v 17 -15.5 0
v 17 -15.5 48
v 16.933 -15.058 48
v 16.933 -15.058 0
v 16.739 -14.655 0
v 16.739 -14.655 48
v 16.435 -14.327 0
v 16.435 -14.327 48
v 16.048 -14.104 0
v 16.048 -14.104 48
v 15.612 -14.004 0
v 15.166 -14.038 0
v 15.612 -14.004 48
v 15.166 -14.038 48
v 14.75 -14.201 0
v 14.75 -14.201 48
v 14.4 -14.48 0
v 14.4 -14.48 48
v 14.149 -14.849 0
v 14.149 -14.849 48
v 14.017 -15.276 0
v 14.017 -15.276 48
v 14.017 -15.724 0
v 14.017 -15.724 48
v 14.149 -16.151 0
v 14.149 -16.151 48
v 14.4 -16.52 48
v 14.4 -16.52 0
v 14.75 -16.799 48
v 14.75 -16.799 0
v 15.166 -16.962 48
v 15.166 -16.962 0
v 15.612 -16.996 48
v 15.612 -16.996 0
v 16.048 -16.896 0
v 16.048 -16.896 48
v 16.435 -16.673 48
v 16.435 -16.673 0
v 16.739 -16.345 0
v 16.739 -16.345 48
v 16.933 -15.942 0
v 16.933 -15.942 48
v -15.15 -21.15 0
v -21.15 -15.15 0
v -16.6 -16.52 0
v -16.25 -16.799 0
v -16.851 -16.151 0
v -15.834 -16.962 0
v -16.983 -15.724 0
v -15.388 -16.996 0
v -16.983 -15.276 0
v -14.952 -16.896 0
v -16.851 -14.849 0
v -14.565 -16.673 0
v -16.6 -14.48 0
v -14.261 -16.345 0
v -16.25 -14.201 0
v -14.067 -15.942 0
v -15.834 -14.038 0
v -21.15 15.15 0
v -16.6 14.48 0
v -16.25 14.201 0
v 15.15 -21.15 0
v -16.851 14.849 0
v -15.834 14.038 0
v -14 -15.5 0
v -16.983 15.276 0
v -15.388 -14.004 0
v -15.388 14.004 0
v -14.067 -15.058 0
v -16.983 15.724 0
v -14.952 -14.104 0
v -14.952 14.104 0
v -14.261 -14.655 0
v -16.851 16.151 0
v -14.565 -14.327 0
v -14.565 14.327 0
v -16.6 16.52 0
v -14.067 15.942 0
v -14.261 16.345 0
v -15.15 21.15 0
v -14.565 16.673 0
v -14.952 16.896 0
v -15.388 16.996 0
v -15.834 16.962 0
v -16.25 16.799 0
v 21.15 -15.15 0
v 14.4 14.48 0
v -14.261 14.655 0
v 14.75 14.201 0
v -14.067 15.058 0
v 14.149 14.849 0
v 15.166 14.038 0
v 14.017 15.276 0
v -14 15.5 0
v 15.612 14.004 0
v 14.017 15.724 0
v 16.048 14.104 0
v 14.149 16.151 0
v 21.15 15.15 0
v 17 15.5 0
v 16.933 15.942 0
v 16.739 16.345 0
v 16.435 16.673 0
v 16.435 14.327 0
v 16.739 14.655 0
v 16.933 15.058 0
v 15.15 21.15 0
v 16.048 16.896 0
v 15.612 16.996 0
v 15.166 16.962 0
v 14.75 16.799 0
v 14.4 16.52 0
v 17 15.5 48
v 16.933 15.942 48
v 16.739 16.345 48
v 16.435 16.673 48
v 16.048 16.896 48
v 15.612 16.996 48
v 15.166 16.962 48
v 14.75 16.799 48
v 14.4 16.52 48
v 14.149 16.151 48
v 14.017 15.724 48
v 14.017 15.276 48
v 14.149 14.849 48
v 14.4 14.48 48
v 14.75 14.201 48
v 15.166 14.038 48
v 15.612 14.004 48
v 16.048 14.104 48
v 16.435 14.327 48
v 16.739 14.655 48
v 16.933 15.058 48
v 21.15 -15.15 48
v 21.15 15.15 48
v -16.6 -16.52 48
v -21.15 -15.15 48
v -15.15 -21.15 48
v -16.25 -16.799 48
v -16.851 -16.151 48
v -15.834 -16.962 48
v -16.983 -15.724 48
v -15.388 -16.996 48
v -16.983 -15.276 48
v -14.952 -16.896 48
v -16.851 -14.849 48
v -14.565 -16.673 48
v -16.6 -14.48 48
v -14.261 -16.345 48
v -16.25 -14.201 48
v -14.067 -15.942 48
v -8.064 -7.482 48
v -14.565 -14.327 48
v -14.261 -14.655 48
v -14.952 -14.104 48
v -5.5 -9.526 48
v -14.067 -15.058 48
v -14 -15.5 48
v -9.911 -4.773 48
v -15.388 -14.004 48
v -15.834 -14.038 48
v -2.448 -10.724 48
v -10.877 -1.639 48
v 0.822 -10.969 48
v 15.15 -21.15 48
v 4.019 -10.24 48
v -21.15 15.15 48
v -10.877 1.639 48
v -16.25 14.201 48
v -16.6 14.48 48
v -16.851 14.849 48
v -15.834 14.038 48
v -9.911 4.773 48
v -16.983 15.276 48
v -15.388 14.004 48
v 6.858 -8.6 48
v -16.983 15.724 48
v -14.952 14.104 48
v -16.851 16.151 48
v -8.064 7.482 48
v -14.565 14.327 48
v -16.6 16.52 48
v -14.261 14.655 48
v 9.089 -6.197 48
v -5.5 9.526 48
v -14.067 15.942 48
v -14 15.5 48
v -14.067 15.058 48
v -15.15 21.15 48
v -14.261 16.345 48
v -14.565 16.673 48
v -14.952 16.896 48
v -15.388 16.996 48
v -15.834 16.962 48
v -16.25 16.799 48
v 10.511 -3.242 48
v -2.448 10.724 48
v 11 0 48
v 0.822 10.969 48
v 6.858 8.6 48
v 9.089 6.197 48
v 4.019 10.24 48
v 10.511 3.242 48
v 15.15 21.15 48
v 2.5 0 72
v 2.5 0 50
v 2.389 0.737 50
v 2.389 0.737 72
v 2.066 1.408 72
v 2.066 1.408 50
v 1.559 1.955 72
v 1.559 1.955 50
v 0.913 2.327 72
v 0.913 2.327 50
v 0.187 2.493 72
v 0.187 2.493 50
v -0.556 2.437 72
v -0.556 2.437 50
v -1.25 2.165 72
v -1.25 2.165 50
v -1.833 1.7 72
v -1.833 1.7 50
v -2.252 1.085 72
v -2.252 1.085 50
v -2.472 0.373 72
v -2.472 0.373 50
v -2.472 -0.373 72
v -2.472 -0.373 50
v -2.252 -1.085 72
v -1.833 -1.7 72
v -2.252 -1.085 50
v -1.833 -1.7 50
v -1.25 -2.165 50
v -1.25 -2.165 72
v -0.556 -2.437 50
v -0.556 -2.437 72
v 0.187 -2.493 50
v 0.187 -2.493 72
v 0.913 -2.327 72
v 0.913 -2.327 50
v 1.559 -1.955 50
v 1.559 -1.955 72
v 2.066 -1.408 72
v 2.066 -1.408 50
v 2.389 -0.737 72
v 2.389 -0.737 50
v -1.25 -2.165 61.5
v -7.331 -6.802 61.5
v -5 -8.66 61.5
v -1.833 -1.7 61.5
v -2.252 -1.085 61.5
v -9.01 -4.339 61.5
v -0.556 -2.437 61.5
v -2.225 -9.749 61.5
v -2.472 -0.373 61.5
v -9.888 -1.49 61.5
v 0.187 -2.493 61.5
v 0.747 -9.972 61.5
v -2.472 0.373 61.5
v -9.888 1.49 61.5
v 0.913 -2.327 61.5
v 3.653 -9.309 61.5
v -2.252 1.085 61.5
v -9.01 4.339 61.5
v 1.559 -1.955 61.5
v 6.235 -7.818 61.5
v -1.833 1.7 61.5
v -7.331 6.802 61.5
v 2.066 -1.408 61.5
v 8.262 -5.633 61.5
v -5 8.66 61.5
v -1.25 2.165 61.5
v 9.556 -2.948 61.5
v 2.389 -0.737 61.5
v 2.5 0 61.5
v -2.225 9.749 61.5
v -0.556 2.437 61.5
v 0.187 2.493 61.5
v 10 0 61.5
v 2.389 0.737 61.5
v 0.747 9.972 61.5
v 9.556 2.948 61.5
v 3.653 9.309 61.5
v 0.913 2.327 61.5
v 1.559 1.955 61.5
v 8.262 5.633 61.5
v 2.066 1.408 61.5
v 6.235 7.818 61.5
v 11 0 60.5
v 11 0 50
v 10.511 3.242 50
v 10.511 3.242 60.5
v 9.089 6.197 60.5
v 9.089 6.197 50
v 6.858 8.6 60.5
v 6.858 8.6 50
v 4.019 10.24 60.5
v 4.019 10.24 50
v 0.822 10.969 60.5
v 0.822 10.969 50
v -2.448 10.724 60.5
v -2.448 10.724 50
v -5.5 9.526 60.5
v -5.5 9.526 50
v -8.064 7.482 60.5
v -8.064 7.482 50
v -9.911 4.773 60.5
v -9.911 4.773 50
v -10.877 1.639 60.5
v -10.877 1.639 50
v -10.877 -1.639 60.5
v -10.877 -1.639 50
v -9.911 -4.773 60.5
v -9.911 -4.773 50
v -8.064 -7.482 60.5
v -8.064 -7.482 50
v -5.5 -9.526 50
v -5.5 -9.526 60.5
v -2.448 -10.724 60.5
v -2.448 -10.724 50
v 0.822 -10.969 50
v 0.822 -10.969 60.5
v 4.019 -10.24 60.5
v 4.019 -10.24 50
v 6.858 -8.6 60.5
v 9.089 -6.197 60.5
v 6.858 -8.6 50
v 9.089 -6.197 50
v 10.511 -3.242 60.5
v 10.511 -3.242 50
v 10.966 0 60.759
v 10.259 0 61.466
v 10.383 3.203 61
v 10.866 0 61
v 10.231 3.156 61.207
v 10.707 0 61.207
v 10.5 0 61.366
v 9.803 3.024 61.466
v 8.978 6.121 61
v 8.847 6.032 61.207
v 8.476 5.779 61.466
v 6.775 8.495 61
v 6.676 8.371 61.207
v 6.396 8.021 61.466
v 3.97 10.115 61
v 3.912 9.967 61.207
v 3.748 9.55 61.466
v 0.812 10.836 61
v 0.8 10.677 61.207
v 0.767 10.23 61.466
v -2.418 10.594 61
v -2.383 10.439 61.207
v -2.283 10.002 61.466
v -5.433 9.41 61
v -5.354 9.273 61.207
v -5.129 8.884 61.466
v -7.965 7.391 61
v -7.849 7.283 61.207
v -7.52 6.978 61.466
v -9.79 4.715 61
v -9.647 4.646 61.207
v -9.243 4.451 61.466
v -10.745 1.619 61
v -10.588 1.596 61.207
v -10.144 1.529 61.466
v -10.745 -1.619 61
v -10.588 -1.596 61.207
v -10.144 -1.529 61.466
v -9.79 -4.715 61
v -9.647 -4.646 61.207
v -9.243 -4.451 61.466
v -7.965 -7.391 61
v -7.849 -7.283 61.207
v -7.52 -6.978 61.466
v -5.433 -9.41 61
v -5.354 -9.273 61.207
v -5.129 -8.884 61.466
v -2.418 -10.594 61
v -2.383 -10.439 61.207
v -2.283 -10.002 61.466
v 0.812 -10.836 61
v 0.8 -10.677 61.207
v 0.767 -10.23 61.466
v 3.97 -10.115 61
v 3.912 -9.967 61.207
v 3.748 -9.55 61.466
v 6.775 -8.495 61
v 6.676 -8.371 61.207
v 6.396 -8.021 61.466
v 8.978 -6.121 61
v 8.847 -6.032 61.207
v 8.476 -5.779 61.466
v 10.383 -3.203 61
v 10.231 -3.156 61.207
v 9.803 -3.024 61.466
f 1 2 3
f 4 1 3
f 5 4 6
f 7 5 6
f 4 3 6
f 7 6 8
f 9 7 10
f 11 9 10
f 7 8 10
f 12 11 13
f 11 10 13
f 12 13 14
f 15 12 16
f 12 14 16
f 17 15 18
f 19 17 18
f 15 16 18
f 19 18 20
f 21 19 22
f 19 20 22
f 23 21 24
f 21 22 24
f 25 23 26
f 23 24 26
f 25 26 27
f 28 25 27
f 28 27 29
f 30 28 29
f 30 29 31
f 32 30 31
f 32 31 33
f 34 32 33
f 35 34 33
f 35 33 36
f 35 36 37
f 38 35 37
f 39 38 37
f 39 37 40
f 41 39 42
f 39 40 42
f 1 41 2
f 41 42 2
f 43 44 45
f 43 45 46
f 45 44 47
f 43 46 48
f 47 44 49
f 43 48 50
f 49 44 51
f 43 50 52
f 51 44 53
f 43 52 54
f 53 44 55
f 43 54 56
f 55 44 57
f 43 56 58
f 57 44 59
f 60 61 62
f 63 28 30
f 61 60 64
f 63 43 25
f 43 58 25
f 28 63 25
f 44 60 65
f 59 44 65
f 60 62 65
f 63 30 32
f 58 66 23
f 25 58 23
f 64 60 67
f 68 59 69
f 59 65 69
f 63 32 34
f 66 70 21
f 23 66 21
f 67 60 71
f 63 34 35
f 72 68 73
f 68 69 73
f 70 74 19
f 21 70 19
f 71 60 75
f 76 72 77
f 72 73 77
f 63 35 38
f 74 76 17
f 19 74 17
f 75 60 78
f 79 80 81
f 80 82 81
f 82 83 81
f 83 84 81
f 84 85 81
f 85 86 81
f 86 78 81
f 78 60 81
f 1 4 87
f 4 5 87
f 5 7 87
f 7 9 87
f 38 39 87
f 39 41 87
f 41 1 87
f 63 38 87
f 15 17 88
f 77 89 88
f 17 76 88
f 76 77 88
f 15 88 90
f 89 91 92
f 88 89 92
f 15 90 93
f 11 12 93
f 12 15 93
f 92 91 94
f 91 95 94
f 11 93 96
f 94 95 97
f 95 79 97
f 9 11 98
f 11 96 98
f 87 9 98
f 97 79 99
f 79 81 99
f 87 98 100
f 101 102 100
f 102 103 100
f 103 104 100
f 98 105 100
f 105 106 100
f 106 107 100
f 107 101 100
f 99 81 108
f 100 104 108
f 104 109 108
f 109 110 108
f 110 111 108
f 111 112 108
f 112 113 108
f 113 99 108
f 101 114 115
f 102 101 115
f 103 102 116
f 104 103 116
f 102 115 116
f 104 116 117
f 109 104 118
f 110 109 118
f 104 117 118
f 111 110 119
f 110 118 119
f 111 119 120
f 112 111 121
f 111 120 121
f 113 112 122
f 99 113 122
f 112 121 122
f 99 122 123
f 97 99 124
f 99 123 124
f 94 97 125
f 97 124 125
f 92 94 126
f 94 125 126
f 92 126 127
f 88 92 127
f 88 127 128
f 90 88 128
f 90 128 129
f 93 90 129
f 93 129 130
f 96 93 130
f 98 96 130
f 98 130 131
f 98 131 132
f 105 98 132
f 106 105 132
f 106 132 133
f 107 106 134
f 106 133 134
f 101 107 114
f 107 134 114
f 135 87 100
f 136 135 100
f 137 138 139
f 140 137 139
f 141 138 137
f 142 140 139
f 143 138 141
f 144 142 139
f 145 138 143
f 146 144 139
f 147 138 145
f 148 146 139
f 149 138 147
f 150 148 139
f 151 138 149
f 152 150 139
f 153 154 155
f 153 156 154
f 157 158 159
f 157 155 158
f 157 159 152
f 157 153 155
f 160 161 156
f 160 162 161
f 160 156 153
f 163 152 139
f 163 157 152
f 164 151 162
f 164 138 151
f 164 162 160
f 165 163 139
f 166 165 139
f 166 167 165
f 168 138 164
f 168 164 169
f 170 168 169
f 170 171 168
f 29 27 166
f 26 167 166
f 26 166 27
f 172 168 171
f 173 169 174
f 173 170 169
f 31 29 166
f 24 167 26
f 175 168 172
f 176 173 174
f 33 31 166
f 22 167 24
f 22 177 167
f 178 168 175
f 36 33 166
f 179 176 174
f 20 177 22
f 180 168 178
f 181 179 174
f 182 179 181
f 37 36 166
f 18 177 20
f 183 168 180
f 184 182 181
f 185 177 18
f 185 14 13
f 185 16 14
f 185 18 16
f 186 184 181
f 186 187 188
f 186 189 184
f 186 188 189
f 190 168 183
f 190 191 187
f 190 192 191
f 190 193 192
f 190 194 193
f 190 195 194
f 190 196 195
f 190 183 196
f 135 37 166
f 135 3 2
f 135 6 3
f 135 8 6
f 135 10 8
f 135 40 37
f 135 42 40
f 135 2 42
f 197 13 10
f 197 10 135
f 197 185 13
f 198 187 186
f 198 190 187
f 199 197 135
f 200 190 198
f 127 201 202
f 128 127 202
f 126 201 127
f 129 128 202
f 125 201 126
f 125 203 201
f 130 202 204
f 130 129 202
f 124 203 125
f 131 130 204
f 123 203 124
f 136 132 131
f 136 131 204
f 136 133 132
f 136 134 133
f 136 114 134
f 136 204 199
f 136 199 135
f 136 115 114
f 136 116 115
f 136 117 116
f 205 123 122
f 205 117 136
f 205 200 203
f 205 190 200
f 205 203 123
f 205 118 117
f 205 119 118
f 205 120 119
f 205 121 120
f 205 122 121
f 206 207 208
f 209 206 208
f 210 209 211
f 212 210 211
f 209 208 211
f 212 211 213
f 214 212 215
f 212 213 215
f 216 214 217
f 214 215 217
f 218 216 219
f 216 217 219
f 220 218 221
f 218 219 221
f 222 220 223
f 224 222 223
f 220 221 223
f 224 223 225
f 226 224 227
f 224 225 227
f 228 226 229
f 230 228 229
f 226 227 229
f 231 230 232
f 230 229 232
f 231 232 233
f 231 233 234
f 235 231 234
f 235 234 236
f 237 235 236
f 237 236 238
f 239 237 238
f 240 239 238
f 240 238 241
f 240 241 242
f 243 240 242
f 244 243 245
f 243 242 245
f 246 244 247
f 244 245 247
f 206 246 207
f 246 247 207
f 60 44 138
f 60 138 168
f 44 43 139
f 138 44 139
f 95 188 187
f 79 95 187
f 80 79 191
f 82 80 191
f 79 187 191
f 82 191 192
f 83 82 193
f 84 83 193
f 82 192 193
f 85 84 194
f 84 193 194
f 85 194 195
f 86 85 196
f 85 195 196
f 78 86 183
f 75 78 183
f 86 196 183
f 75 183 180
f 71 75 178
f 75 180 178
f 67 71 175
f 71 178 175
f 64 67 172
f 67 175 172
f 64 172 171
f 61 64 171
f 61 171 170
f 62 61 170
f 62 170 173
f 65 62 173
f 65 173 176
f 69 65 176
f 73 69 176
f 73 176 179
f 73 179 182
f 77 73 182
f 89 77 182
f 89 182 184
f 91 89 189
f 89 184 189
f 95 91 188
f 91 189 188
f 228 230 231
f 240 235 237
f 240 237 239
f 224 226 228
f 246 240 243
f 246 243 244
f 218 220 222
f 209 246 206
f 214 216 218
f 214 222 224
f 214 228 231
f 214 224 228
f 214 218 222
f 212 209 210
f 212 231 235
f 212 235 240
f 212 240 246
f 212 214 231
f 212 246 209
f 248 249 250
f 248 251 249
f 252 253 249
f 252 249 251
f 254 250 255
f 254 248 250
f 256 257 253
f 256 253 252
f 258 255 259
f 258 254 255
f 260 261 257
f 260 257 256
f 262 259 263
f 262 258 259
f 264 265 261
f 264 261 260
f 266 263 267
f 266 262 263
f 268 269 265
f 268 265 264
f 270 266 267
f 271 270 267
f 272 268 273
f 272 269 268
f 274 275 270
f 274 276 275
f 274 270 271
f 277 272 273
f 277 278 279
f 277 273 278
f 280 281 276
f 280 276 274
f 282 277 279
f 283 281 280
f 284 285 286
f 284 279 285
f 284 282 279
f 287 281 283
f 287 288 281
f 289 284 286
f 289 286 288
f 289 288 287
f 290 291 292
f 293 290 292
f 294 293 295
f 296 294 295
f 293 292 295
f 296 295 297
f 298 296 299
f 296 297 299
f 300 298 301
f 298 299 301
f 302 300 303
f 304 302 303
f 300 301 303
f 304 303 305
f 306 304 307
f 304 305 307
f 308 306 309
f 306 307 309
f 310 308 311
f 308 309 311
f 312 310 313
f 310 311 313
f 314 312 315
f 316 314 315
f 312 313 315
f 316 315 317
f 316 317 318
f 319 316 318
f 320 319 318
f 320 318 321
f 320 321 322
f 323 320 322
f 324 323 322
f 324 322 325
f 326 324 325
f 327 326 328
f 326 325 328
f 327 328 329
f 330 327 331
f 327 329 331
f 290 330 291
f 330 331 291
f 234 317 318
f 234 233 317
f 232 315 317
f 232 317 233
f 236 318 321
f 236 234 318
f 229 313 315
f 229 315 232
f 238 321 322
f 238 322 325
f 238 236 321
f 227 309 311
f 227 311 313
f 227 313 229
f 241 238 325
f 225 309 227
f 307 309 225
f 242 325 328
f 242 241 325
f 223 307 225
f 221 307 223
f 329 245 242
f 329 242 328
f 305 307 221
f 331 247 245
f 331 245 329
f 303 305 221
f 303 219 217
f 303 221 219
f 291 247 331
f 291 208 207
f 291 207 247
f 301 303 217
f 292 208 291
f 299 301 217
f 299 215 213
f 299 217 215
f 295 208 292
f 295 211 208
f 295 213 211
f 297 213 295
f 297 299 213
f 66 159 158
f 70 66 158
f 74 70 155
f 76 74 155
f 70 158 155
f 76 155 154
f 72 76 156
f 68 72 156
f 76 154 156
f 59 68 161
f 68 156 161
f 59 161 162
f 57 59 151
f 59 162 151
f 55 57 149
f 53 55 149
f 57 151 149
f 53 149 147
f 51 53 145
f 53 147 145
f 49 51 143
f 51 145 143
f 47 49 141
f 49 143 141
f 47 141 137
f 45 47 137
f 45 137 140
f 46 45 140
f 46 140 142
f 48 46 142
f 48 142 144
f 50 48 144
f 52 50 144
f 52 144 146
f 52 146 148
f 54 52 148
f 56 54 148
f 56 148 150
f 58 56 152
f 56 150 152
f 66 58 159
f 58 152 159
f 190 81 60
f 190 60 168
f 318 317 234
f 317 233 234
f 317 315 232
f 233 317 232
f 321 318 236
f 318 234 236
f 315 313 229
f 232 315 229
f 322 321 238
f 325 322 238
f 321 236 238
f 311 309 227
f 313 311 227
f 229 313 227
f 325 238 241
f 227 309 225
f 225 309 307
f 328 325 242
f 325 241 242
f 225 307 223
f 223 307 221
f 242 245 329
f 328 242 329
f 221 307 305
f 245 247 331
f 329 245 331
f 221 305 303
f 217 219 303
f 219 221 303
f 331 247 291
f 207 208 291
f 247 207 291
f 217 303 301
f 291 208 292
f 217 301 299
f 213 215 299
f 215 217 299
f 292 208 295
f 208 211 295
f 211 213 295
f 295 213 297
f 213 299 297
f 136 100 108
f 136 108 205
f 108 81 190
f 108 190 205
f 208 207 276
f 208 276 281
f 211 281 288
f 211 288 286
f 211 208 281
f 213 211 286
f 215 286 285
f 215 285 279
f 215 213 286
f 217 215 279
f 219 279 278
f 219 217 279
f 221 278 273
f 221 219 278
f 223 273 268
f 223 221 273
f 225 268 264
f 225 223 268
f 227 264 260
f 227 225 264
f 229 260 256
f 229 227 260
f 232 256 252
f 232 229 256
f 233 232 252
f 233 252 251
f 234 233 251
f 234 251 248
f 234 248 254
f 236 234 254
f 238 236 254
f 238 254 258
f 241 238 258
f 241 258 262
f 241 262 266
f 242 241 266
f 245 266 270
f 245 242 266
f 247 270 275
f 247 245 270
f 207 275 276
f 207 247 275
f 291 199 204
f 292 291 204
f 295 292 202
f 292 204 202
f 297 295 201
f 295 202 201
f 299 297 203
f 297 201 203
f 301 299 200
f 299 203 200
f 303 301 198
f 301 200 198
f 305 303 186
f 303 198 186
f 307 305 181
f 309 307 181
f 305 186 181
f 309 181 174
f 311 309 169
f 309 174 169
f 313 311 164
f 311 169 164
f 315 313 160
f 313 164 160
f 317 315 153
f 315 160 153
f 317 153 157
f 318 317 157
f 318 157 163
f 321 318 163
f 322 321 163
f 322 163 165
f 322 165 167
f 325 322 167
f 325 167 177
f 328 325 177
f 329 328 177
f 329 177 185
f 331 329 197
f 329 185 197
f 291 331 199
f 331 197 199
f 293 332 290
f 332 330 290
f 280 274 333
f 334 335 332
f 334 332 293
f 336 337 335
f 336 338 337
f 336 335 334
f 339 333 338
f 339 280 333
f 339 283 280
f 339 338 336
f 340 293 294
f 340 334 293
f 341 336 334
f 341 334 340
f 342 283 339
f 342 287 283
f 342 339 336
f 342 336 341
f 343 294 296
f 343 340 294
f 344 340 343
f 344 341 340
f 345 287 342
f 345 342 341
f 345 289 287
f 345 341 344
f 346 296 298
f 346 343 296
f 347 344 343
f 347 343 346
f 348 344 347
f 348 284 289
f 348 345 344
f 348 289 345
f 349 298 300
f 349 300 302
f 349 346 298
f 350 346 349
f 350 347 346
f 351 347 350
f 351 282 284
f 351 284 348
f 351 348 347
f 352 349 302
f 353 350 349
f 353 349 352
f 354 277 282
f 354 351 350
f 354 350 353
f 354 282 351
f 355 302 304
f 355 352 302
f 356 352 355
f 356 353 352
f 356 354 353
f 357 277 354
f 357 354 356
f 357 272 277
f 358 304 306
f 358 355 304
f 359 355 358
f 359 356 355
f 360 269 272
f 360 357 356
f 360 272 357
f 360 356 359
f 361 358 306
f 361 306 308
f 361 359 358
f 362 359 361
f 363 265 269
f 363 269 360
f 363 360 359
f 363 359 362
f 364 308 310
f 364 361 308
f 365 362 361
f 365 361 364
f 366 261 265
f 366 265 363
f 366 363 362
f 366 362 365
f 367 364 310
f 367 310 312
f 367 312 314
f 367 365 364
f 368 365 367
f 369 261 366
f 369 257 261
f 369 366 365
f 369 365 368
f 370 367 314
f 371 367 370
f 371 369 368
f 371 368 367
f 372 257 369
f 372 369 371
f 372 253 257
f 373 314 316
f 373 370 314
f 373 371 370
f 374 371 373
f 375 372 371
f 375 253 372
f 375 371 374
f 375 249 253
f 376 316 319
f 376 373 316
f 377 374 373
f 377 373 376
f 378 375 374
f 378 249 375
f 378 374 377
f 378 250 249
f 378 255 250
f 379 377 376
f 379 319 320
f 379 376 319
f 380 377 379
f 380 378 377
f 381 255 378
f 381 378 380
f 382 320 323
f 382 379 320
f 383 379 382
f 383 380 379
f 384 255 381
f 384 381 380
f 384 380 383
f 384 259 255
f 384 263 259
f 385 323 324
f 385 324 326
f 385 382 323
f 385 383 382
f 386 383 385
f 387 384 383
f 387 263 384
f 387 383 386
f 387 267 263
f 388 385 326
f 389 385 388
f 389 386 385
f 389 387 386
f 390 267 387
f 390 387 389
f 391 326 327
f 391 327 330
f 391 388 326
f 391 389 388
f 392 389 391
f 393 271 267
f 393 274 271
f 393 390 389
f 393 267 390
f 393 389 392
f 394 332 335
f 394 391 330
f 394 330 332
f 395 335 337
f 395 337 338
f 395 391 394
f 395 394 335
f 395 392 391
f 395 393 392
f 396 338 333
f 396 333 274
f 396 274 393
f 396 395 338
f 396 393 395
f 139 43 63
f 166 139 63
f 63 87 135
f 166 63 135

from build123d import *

# Parameters (mm, degrees)
F0_W      = 42.3
F0_H      = 42.3
F1_DEPTH  = 48
F2_R      = 11
F3_DEPTH  = 2
F4_R      = 2.5
F5_DEPTH  = 22
F6_R      = 1.5
F7_DEPTH  = 48
F8_SIZE   = 6
F9_R      = 11
F9_R_2    = 2.5
F10_DEPTH = 11.5
F11_R     = 1


with BuildPart() as f1:
    # F0 (on Top) → F1 (new body)
    with BuildSketch(Plane.XY):
        Rectangle(F0_W, F0_H)
    extrude(amount=F1_DEPTH)

    # F2 (on face) → F3 (join)
    with BuildSketch(Plane.XY.offset(48)):
        Circle(F2_R)
    extrude(amount=F3_DEPTH)

    # F4 (on face) → F5 (join)
    with BuildSketch(Plane.XY.offset(50)):
        Circle(F4_R)
    extrude(amount=F5_DEPTH)

    # F6 (on face) → F7 (cut)
    with BuildSketch(Plane.XY.offset(48)):
        with Locations((15.5, -15.5)):
            Circle(F6_R)
        with Locations((15.5, 15.5)):
            Circle(F6_R)
        with Locations((-15.5, -15.5)):
            Circle(F6_R)
        with Locations((-15.5, 15.5)):
            Circle(F6_R)
    extrude(amount=-F7_DEPTH, mode=Mode.SUBTRACT)

    # F8
    f8_edges = [f1.edges().sort_by_distance(p)[0] for p in [
        (21.15, -21.15, 24),
        (-21.15, -21.15, 24),
        (21.15, 21.15, 24),
        (-21.15, 21.15, 24),
    ]]
    chamfer(f8_edges, length=F8_SIZE)


with BuildPart() as f10:
    # F9 (on face) → F10 (new body)
    with BuildSketch(Plane.XY.offset(50)):
        Circle(F9_R)
        Circle(F9_R_2, mode=Mode.SUBTRACT)
    extrude(amount=F10_DEPTH)

    # F11
    f11_edges = [f10.edges().sort_by_distance(p)[0] for p in [
        (-11, 0, 61.5),
    ]]
    fillet(f11_edges, radius=F11_R)


solid = Compound([f1.part, f10.part])
